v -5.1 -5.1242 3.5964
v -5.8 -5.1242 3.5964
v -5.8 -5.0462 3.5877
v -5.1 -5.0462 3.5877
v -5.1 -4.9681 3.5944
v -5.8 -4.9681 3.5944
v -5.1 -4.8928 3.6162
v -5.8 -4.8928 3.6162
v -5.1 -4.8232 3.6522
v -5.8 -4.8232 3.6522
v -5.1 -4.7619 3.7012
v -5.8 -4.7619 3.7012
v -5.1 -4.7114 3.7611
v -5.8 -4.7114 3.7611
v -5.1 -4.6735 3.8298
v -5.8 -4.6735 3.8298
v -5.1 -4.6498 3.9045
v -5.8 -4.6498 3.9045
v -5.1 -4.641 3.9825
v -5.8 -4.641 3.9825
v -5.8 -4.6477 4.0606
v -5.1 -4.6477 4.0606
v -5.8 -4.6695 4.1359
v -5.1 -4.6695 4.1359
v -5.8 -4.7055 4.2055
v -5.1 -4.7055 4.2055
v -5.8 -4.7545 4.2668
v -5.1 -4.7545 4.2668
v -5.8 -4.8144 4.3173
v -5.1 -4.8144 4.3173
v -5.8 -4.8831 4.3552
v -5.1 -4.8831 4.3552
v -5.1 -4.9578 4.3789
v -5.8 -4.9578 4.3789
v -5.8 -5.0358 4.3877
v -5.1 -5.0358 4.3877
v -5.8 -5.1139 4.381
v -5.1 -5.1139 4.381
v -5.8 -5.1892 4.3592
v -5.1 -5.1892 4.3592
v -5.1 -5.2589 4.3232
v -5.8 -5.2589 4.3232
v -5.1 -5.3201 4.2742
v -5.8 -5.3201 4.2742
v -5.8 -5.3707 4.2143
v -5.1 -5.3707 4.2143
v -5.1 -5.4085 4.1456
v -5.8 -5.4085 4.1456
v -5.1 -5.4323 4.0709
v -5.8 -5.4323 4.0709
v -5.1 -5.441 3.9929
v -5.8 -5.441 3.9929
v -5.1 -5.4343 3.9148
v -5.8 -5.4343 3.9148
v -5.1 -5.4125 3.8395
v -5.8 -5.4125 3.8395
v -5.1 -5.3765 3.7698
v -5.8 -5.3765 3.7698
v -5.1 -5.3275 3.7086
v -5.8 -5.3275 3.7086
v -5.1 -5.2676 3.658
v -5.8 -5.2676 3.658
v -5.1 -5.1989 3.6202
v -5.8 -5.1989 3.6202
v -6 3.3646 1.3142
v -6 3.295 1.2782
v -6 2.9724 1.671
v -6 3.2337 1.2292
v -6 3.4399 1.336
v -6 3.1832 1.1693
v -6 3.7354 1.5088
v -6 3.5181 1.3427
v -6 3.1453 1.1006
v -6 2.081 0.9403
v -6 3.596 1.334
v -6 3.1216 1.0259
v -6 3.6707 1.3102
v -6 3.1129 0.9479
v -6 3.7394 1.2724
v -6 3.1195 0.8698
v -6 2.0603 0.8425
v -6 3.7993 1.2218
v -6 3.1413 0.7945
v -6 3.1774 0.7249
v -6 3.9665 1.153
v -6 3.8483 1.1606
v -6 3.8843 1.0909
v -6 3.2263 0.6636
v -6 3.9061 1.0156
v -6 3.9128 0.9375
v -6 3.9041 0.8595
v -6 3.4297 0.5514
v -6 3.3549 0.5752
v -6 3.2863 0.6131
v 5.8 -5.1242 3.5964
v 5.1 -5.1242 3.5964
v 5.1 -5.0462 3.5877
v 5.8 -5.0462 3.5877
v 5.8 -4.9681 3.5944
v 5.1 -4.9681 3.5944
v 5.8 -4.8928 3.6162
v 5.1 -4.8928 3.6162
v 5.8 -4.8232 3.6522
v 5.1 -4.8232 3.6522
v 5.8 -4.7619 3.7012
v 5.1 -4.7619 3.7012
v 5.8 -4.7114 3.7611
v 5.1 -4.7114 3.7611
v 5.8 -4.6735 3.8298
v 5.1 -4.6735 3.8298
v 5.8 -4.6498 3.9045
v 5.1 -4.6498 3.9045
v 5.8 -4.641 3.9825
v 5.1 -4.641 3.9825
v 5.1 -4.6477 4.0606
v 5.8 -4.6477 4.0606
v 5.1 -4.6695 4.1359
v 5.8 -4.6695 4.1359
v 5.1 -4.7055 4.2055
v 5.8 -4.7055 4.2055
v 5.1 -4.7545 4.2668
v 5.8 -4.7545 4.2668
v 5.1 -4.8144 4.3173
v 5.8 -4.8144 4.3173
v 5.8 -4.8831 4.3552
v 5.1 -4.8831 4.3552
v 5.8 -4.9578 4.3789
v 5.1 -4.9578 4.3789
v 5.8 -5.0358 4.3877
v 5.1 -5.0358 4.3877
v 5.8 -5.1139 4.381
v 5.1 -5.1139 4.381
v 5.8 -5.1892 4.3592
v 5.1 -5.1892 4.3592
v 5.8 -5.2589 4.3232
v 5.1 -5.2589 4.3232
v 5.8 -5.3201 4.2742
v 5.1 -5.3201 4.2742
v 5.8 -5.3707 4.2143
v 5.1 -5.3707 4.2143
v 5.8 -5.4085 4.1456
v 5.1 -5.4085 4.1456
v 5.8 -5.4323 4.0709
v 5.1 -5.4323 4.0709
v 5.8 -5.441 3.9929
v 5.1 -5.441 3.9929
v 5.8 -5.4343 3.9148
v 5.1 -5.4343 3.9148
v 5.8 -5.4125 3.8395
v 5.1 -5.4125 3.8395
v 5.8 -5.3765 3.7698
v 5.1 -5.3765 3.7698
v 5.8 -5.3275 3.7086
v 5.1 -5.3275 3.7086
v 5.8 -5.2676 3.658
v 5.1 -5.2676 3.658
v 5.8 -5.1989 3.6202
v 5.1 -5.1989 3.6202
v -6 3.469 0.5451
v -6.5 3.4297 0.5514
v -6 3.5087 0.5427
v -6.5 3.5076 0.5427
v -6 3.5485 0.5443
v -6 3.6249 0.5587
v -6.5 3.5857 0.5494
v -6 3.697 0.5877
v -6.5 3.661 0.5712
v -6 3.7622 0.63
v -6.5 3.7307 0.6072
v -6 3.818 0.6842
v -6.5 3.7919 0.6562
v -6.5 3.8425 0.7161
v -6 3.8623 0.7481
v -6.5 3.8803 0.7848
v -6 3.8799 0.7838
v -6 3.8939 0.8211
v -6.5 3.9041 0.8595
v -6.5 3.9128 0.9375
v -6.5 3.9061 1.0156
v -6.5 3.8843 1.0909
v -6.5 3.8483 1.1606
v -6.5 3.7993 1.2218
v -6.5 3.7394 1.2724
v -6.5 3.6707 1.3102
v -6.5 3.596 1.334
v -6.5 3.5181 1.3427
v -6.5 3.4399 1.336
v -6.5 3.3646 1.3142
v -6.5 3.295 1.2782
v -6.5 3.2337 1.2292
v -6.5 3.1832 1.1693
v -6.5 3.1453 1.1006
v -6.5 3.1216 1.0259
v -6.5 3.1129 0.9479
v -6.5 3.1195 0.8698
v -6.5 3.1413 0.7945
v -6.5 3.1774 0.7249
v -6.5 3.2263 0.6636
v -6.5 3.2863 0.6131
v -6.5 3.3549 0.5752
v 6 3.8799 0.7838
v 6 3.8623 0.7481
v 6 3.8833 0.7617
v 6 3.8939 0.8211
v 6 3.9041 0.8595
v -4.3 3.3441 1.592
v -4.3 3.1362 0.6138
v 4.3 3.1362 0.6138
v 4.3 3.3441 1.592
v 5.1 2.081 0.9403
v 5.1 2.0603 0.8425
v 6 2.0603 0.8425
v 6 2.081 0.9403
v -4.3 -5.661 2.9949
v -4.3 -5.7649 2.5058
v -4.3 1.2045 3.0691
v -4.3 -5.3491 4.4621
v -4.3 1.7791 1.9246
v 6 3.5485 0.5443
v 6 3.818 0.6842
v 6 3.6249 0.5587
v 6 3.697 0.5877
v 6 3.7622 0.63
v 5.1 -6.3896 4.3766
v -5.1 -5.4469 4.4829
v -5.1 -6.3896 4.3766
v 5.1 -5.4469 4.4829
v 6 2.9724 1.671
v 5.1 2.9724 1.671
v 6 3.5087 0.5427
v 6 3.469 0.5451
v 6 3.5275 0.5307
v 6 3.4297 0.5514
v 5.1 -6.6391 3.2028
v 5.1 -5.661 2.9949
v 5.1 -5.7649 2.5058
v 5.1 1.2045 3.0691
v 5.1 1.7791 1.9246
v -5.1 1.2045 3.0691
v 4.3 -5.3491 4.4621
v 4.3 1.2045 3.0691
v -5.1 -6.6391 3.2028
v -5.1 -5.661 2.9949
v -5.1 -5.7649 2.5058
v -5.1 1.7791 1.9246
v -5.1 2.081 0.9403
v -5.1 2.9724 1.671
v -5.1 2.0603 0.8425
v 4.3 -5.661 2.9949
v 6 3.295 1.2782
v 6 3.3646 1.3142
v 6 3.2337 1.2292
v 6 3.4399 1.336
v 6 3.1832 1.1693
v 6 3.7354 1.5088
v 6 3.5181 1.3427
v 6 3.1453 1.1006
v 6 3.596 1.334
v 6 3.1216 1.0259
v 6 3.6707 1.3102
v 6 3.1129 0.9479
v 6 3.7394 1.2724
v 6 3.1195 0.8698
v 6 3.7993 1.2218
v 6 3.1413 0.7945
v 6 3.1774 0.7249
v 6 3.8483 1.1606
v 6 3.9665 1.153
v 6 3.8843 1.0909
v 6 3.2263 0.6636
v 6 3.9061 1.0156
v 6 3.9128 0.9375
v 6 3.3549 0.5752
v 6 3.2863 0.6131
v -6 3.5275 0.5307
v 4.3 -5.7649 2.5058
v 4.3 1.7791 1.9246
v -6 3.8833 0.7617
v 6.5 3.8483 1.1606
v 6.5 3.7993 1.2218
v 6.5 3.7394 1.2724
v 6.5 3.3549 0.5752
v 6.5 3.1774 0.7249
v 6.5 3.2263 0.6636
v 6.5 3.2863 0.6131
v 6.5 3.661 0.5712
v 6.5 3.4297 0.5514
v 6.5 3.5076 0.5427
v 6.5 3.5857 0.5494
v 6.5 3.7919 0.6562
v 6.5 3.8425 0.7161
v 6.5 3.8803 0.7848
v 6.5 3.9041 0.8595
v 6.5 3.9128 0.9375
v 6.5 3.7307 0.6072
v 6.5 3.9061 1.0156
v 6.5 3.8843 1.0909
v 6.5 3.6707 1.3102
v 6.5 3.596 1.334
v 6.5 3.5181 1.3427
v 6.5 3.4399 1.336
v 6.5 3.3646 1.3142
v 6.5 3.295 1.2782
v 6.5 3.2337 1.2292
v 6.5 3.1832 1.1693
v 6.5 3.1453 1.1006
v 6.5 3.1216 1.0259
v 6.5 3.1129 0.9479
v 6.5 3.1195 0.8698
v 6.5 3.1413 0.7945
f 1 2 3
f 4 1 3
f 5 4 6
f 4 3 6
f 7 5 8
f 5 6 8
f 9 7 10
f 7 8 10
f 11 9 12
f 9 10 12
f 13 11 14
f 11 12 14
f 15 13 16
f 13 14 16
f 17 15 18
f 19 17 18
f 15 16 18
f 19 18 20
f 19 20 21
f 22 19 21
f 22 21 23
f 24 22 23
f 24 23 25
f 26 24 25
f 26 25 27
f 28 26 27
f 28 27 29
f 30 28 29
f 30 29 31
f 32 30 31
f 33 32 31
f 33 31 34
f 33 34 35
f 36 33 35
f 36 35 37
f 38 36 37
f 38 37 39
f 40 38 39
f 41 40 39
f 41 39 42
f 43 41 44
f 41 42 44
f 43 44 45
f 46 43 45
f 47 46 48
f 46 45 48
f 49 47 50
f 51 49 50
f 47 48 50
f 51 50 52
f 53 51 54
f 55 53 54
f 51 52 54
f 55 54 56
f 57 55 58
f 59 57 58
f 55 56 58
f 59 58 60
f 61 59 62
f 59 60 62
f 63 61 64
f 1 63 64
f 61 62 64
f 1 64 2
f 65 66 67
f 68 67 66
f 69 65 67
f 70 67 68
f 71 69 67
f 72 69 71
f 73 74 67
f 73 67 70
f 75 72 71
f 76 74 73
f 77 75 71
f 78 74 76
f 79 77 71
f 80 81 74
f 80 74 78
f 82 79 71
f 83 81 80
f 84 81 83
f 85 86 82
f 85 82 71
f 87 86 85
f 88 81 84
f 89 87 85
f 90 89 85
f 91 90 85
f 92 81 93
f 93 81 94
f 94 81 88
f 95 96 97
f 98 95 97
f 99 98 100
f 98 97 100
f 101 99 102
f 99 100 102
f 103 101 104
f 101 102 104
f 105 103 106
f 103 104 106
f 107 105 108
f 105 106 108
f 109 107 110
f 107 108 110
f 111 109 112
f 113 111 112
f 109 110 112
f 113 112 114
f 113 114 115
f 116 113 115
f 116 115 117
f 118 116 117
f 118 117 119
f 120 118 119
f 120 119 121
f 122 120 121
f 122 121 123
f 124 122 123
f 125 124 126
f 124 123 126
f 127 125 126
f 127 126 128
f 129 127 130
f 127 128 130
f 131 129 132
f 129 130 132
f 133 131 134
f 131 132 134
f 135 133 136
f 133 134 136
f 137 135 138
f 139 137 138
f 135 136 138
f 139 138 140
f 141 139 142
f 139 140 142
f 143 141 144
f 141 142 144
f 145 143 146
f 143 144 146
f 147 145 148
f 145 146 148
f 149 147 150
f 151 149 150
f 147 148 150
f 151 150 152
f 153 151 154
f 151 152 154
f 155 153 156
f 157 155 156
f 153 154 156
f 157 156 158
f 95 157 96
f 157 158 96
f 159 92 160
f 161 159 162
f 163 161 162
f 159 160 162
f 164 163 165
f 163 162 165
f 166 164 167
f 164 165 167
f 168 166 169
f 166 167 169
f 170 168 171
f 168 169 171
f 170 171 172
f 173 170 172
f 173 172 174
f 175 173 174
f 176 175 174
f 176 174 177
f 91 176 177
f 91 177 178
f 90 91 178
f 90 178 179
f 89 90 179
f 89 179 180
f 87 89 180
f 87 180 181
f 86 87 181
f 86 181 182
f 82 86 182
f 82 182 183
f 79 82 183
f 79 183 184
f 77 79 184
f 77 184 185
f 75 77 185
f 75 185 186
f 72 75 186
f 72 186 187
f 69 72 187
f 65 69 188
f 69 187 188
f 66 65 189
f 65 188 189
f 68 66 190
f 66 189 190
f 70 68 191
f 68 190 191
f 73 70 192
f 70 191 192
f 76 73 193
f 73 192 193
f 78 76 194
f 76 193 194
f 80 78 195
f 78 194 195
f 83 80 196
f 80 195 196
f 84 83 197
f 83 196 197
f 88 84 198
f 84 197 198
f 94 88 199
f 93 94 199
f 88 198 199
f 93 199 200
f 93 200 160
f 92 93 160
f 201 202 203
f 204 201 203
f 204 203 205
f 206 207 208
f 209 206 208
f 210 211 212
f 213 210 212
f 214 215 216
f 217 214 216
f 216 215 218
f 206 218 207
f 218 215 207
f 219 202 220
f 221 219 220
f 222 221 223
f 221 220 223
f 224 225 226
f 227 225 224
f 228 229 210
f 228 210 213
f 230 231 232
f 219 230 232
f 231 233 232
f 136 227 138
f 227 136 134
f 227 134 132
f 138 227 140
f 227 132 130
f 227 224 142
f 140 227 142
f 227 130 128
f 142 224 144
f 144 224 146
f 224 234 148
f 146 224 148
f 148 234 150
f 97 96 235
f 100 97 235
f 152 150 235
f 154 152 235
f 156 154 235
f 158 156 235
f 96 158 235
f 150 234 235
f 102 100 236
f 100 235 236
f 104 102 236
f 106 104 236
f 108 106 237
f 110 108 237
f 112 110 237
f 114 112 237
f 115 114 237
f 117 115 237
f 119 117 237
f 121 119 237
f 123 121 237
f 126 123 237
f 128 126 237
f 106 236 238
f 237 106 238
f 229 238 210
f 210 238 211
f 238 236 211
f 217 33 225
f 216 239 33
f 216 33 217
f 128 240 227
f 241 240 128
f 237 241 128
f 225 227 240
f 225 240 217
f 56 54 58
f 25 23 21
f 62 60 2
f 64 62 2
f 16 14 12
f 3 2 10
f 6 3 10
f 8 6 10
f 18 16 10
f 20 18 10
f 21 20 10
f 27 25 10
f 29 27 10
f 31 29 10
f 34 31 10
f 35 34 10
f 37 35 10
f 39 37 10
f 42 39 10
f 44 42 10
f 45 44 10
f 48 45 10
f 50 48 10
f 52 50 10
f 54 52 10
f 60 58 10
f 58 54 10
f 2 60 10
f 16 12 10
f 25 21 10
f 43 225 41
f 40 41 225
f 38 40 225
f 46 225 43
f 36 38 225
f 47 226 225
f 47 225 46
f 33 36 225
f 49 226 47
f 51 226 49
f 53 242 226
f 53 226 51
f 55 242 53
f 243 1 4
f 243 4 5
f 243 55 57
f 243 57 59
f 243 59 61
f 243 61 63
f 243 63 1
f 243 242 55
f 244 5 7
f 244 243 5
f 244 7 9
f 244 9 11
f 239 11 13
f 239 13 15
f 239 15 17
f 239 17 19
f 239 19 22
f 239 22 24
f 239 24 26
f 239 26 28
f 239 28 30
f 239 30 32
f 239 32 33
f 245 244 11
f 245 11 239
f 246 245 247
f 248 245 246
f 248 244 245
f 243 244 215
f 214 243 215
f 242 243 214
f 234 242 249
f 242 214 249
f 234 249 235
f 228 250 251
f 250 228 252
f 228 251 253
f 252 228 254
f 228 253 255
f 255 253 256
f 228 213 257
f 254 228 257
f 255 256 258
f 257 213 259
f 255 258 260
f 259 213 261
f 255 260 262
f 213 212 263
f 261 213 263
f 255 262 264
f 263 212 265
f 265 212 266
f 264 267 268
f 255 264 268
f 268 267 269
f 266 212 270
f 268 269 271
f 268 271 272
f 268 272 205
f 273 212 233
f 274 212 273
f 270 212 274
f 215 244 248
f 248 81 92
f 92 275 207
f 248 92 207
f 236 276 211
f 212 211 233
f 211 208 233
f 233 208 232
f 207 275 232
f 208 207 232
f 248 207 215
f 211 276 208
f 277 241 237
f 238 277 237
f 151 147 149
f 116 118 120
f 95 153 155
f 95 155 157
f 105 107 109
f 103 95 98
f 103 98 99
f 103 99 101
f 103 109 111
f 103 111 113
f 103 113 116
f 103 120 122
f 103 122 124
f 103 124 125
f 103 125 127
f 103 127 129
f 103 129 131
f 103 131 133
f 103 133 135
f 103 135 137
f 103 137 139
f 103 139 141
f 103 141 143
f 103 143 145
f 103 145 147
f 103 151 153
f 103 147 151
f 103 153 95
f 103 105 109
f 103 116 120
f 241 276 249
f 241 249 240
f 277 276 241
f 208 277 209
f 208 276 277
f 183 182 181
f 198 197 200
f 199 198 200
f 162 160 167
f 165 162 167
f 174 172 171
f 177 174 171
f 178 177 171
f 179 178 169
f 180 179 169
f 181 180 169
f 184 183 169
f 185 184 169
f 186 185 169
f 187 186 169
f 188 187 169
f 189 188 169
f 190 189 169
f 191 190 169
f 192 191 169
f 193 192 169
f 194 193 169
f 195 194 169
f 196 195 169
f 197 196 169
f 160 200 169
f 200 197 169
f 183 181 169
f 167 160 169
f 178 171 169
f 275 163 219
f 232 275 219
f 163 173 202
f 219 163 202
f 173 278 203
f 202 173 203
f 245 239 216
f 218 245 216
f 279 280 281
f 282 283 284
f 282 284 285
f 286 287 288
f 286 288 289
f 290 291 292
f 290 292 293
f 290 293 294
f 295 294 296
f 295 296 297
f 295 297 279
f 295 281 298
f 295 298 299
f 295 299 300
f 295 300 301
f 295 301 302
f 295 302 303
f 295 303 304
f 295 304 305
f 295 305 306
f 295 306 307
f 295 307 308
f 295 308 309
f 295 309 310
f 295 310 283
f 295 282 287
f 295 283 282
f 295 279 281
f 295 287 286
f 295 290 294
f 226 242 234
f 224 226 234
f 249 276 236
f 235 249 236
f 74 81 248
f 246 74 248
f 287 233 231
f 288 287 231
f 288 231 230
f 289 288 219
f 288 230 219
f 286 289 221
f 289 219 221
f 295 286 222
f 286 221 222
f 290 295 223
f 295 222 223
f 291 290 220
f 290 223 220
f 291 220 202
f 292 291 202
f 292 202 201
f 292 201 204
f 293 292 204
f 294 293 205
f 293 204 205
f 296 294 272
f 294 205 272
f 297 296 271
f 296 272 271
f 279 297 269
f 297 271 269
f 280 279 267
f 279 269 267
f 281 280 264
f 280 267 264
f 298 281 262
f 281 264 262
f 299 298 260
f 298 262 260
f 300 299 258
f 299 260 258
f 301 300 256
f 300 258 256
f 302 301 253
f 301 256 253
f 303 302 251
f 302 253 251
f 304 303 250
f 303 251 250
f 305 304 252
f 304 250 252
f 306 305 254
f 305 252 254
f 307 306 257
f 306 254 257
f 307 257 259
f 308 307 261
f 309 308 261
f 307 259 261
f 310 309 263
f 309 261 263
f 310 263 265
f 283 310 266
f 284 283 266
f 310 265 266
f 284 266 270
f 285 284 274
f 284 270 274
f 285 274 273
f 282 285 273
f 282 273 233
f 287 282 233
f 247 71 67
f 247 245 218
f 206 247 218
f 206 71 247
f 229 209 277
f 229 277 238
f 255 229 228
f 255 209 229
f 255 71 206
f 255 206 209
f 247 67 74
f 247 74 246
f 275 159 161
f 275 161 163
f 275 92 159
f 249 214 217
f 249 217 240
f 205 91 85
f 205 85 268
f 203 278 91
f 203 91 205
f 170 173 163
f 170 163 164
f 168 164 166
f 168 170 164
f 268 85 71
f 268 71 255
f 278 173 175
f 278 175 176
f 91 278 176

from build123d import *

# Parameters (mm, degrees)
BOX058_W                  = 0.8
BOX058_H                  = 7.5
BOX058_DEPTH              = 2
CHAMFER029_SIZE2          = 0.8
CHAMFER029_SIZE           = 1
BOX057_W                  = 0.8
BOX057_H                  = 7.5
BOX057_DEPTH              = 2
CHAMFER030_SIZE2          = 0.8
CHAMFER030_SIZE           = 1
BOX061_W                  = 10.2
BOX061_H                  = 0.7
BOX061_DEPTH              = 1
CHAMFER033_SIZE           = 0.3
CYLINDER013_R             = 0.4
CYLINDER013_DEPTH         = 0.5
CYLINDER014_R             = 0.4
CYLINDER014_DEPTH         = 0.5
CYLINDER015_R             = 0.4
CYLINDER015_DEPTH         = 0.7
CYLINDER016_R             = 0.4
CYLINDER016_DEPTH         = 0.7
BOX059_W                  = 0.8
BOX059_H                  = 1.6
BOX059_DEPTH              = 1
BOX060_W                  = 0.8
BOX060_H                  = 1.6
BOX060_DEPTH              = 1
BOX065_W                  = 0.9
BOX065_H                  = 1.8
BOX065_DEPTH              = 1
CHAMFER041_1_SIZE2        = 0.72
CHAMFER041_1_SIZE         = 0.9
CHAMFER041_2_SIZE         = 0.3
BOX064_W                  = 0.9
BOX064_H                  = 1.8
BOX064_DEPTH              = 1
CHAMFER042_1_SIZE2        = 0.72
CHAMFER042_1_SIZE         = 0.9
CHAMFER042_2_SIZE         = 0.3
BOX056_W                  = 10.2
BOX056_H                  = 1
BOX056_DEPTH              = 1.5
CHAMFER028_SIZE2          = 0.9
CHAMFER028_SIZE           = 0.3
FUSION014_PLACEMENT_ANGLE = 12


with BuildPart() as pg1425_frontshaftcham002:
    # Box058 → Box058 (new body)
    with BuildSketch(Plane(origin=(-5.1, -6, 0.5), x_dir=(1, 0, 0), z_dir=(0, 0, 1))):
        with Locations((0.4, 3.75)):
            Rectangle(BOX058_W, BOX058_H)
    extrude(amount=BOX058_DEPTH)

    # Chamfer029
    chamfer029_edges = [pg1425_frontshaftcham002.edges().sort_by_distance(p)[0] for p in [
        (-4.7, 1.5, 2.5),
    ]]
    chamfer029_side = pg1425_frontshaftcham002.faces().sort_by_distance((-4.7, 1.5, 1.5))[0]
    chamfer(chamfer029_edges, length=CHAMFER029_SIZE, length2=CHAMFER029_SIZE2, reference=chamfer029_side)


with BuildPart() as pg1425_frontshaftcham003:
    # Box057 → Box057 (new body)
    with BuildSketch(Plane(origin=(4.3, -6, 0.5), x_dir=(1, 0, 0), z_dir=(0, 0, 1))):
        with Locations((0.4, 3.75)):
            Rectangle(BOX057_W, BOX057_H)
    extrude(amount=BOX057_DEPTH)

    # Chamfer030
    chamfer030_edges = [pg1425_frontshaftcham003.edges().sort_by_distance(p)[0] for p in [
        (4.7, 1.5, 2.5),
    ]]
    chamfer030_side = pg1425_frontshaftcham003.faces().sort_by_distance((4.7, 1.5, 1.5))[0]
    chamfer(chamfer030_edges, length=CHAMFER030_SIZE, length2=CHAMFER030_SIZE2, reference=chamfer030_side)


with BuildPart() as pg1425_frontshaftcham006:
    # Box061 → Box061 (new body)
    with BuildSketch(Plane(origin=(-5.1, 3.1, 0.5), x_dir=(1, 0, 0), z_dir=(0, 0, 1))):
        with Locations((5.1, 0.35)):
            Rectangle(BOX061_W, BOX061_H)
    extrude(amount=BOX061_DEPTH)

    # Chamfer033
    chamfer033_edges = [pg1425_frontshaftcham006.edges().sort_by_distance(p)[0] for p in [
        (0, 3.8, 0.5),
        (0, 3.8, 1.5),
    ]]
    chamfer(chamfer033_edges, length=CHAMFER033_SIZE)


with BuildPart() as pg1425_frontshaft009:
    # Cylinder013 → Cylinder013 (new body)
    with BuildSketch(Plane(origin=(-6.5, 3.4, 0.9), x_dir=(0, 0, -1), z_dir=(1, 0, 0))):
        Circle(CYLINDER013_R)
    extrude(amount=CYLINDER013_DEPTH)


with BuildPart() as pg1425_frontshaft010:
    # Cylinder014 → Cylinder014 (new body)
    with BuildSketch(Plane(origin=(6, 3.4, 0.9), x_dir=(0, 0, -1), z_dir=(1, 0, 0))):
        Circle(CYLINDER014_R)
    extrude(amount=CYLINDER014_DEPTH)


with BuildPart() as pg1425_frontshaft011:
    # Cylinder015 → Cylinder015 (new body)
    with BuildSketch(Plane(origin=(-5.8, -5.6, 2.1), x_dir=(0, 0, -1), z_dir=(1, 0, 0))):
        Circle(CYLINDER015_R)
    extrude(amount=CYLINDER015_DEPTH)


with BuildPart() as pg1425_frontshaft012:
    # Cylinder016 → Cylinder016 (new body)
    with BuildSketch(Plane(origin=(5.1, -5.6, 2.1), x_dir=(0, 0, -1), z_dir=(1, 0, 0))):
        Circle(CYLINDER016_R)
    extrude(amount=CYLINDER016_DEPTH)


with BuildPart() as pg1425_frontshaft004:
    # Box059 → Box059 (new body)
    with BuildSketch(Plane(origin=(-5.1, 1.5, 0.5), x_dir=(1, 0, 0), z_dir=(0, 0, 1))):
        with Locations((0.4, 0.8)):
            Rectangle(BOX059_W, BOX059_H)
    extrude(amount=BOX059_DEPTH)


with BuildPart() as pg1425_frontshaft005:
    # Box060 → Box060 (new body)
    with BuildSketch(Plane(origin=(4.3, 1.5, 0.5), x_dir=(1, 0, 0), z_dir=(0, 0, 1))):
        with Locations((0.4, 0.8)):
            Rectangle(BOX060_W, BOX060_H)
    extrude(amount=BOX060_DEPTH)


with BuildPart() as pg1425_frontshaftcham007:
    # Box065 → Box065 (new body)
    with BuildSketch(Plane(origin=(-6, 2, 0.5), x_dir=(1, 0, 0), z_dir=(0, 0, 1))):
        with Locations((0.45, 0.9)):
            Rectangle(BOX065_W, BOX065_H)
    extrude(amount=BOX065_DEPTH)

    # Chamfer041 1
    chamfer041_1_edges = [pg1425_frontshaftcham007.edges().sort_by_distance(p)[0] for p in [
        (-5.55, 2, 1.5),
    ]]
    chamfer041_1_side = pg1425_frontshaftcham007.faces().sort_by_distance((-5.55, 2, 1))[0]
    chamfer(chamfer041_1_edges, length=CHAMFER041_1_SIZE, length2=CHAMFER041_1_SIZE2, reference=chamfer041_1_side)

    # Chamfer041 2
    chamfer041_2_edges = [pg1425_frontshaftcham007.edges().sort_by_distance(p)[0] for p in [
        (-5.55, 3.8, 0.5),
        (-5.55, 3.8, 1.5),
    ]]
    chamfer(chamfer041_2_edges, length=CHAMFER041_2_SIZE)


with BuildPart() as pg1425_frontshaftcham008:
    # Box064 → Box064 (new body)
    with BuildSketch(Plane(origin=(5.1, 2, 0.5), x_dir=(1, 0, 0), z_dir=(0, 0, 1))):
        with Locations((0.45, 0.9)):
            Rectangle(BOX064_W, BOX064_H)
    extrude(amount=BOX064_DEPTH)

    # Chamfer042 1
    chamfer042_1_edges = [pg1425_frontshaftcham008.edges().sort_by_distance(p)[0] for p in [
        (5.55, 2, 1.5),
    ]]
    chamfer042_1_side = pg1425_frontshaftcham008.faces().sort_by_distance((5.55, 2, 1))[0]
    chamfer(chamfer042_1_edges, length=CHAMFER042_1_SIZE, length2=CHAMFER042_1_SIZE2, reference=chamfer042_1_side)

    # Chamfer042 2
    chamfer042_2_edges = [pg1425_frontshaftcham008.edges().sort_by_distance(p)[0] for p in [
        (5.55, 3.8, 0.5),
        (5.55, 3.8, 1.5),
    ]]
    chamfer(chamfer042_2_edges, length=CHAMFER042_2_SIZE)


with BuildPart() as pg1425_frontshaft:
    # Box056 → Box056 (new body)
    with BuildSketch(Plane(origin=(-5.1, -7, 1), x_dir=(1, 0, 0), z_dir=(0, 0, 1))):
        with Locations((5.1, 0.5)):
            Rectangle(BOX056_W, BOX056_H)
    extrude(amount=BOX056_DEPTH)

    # Chamfer028
    chamfer028_edges = [pg1425_frontshaft.edges().sort_by_distance(p)[0] for p in [
        (0, -7, 2.5),
    ]]
    chamfer028_side = pg1425_frontshaft.faces().sort_by_distance((0, -7, 1.75))[0]
    chamfer(chamfer028_edges, length=CHAMFER028_SIZE, length2=CHAMFER028_SIZE2, reference=chamfer028_side)

    # Fusion014: union PG1425_FrontShaftCham002, PG1425_FrontShaftCham003, PG1425_FrontShaftCham006, PG1425_FrontShaft009, PG1425_FrontShaft010, PG1425_FrontShaft011, PG1425_FrontShaft012, PG1425_FrontShaft004, PG1425_FrontShaft005, PG1425_FrontShaftCham007, PG1425_FrontShaftCham008
    add(pg1425_frontshaftcham002.part)
    add(pg1425_frontshaftcham003.part)
    add(pg1425_frontshaftcham006.part)
    add(pg1425_frontshaft009.part)
    add(pg1425_frontshaft010.part)
    add(pg1425_frontshaft011.part)
    add(pg1425_frontshaft012.part)
    add(pg1425_frontshaft004.part)
    add(pg1425_frontshaft005.part)
    add(pg1425_frontshaftcham007.part)
    add(pg1425_frontshaftcham008.part)


with BuildPart() as pg1425_frontshaft_1:
    # Fusion014 placement: moved
    add(pg1425_frontshaft.part.moved(Location((0, 0, 0.769273))).rotate(Axis((0, 0, 0.769273), (-1, 0, 0)), FUSION014_PLACEMENT_ANGLE))


solid = pg1425_frontshaft_1.part
